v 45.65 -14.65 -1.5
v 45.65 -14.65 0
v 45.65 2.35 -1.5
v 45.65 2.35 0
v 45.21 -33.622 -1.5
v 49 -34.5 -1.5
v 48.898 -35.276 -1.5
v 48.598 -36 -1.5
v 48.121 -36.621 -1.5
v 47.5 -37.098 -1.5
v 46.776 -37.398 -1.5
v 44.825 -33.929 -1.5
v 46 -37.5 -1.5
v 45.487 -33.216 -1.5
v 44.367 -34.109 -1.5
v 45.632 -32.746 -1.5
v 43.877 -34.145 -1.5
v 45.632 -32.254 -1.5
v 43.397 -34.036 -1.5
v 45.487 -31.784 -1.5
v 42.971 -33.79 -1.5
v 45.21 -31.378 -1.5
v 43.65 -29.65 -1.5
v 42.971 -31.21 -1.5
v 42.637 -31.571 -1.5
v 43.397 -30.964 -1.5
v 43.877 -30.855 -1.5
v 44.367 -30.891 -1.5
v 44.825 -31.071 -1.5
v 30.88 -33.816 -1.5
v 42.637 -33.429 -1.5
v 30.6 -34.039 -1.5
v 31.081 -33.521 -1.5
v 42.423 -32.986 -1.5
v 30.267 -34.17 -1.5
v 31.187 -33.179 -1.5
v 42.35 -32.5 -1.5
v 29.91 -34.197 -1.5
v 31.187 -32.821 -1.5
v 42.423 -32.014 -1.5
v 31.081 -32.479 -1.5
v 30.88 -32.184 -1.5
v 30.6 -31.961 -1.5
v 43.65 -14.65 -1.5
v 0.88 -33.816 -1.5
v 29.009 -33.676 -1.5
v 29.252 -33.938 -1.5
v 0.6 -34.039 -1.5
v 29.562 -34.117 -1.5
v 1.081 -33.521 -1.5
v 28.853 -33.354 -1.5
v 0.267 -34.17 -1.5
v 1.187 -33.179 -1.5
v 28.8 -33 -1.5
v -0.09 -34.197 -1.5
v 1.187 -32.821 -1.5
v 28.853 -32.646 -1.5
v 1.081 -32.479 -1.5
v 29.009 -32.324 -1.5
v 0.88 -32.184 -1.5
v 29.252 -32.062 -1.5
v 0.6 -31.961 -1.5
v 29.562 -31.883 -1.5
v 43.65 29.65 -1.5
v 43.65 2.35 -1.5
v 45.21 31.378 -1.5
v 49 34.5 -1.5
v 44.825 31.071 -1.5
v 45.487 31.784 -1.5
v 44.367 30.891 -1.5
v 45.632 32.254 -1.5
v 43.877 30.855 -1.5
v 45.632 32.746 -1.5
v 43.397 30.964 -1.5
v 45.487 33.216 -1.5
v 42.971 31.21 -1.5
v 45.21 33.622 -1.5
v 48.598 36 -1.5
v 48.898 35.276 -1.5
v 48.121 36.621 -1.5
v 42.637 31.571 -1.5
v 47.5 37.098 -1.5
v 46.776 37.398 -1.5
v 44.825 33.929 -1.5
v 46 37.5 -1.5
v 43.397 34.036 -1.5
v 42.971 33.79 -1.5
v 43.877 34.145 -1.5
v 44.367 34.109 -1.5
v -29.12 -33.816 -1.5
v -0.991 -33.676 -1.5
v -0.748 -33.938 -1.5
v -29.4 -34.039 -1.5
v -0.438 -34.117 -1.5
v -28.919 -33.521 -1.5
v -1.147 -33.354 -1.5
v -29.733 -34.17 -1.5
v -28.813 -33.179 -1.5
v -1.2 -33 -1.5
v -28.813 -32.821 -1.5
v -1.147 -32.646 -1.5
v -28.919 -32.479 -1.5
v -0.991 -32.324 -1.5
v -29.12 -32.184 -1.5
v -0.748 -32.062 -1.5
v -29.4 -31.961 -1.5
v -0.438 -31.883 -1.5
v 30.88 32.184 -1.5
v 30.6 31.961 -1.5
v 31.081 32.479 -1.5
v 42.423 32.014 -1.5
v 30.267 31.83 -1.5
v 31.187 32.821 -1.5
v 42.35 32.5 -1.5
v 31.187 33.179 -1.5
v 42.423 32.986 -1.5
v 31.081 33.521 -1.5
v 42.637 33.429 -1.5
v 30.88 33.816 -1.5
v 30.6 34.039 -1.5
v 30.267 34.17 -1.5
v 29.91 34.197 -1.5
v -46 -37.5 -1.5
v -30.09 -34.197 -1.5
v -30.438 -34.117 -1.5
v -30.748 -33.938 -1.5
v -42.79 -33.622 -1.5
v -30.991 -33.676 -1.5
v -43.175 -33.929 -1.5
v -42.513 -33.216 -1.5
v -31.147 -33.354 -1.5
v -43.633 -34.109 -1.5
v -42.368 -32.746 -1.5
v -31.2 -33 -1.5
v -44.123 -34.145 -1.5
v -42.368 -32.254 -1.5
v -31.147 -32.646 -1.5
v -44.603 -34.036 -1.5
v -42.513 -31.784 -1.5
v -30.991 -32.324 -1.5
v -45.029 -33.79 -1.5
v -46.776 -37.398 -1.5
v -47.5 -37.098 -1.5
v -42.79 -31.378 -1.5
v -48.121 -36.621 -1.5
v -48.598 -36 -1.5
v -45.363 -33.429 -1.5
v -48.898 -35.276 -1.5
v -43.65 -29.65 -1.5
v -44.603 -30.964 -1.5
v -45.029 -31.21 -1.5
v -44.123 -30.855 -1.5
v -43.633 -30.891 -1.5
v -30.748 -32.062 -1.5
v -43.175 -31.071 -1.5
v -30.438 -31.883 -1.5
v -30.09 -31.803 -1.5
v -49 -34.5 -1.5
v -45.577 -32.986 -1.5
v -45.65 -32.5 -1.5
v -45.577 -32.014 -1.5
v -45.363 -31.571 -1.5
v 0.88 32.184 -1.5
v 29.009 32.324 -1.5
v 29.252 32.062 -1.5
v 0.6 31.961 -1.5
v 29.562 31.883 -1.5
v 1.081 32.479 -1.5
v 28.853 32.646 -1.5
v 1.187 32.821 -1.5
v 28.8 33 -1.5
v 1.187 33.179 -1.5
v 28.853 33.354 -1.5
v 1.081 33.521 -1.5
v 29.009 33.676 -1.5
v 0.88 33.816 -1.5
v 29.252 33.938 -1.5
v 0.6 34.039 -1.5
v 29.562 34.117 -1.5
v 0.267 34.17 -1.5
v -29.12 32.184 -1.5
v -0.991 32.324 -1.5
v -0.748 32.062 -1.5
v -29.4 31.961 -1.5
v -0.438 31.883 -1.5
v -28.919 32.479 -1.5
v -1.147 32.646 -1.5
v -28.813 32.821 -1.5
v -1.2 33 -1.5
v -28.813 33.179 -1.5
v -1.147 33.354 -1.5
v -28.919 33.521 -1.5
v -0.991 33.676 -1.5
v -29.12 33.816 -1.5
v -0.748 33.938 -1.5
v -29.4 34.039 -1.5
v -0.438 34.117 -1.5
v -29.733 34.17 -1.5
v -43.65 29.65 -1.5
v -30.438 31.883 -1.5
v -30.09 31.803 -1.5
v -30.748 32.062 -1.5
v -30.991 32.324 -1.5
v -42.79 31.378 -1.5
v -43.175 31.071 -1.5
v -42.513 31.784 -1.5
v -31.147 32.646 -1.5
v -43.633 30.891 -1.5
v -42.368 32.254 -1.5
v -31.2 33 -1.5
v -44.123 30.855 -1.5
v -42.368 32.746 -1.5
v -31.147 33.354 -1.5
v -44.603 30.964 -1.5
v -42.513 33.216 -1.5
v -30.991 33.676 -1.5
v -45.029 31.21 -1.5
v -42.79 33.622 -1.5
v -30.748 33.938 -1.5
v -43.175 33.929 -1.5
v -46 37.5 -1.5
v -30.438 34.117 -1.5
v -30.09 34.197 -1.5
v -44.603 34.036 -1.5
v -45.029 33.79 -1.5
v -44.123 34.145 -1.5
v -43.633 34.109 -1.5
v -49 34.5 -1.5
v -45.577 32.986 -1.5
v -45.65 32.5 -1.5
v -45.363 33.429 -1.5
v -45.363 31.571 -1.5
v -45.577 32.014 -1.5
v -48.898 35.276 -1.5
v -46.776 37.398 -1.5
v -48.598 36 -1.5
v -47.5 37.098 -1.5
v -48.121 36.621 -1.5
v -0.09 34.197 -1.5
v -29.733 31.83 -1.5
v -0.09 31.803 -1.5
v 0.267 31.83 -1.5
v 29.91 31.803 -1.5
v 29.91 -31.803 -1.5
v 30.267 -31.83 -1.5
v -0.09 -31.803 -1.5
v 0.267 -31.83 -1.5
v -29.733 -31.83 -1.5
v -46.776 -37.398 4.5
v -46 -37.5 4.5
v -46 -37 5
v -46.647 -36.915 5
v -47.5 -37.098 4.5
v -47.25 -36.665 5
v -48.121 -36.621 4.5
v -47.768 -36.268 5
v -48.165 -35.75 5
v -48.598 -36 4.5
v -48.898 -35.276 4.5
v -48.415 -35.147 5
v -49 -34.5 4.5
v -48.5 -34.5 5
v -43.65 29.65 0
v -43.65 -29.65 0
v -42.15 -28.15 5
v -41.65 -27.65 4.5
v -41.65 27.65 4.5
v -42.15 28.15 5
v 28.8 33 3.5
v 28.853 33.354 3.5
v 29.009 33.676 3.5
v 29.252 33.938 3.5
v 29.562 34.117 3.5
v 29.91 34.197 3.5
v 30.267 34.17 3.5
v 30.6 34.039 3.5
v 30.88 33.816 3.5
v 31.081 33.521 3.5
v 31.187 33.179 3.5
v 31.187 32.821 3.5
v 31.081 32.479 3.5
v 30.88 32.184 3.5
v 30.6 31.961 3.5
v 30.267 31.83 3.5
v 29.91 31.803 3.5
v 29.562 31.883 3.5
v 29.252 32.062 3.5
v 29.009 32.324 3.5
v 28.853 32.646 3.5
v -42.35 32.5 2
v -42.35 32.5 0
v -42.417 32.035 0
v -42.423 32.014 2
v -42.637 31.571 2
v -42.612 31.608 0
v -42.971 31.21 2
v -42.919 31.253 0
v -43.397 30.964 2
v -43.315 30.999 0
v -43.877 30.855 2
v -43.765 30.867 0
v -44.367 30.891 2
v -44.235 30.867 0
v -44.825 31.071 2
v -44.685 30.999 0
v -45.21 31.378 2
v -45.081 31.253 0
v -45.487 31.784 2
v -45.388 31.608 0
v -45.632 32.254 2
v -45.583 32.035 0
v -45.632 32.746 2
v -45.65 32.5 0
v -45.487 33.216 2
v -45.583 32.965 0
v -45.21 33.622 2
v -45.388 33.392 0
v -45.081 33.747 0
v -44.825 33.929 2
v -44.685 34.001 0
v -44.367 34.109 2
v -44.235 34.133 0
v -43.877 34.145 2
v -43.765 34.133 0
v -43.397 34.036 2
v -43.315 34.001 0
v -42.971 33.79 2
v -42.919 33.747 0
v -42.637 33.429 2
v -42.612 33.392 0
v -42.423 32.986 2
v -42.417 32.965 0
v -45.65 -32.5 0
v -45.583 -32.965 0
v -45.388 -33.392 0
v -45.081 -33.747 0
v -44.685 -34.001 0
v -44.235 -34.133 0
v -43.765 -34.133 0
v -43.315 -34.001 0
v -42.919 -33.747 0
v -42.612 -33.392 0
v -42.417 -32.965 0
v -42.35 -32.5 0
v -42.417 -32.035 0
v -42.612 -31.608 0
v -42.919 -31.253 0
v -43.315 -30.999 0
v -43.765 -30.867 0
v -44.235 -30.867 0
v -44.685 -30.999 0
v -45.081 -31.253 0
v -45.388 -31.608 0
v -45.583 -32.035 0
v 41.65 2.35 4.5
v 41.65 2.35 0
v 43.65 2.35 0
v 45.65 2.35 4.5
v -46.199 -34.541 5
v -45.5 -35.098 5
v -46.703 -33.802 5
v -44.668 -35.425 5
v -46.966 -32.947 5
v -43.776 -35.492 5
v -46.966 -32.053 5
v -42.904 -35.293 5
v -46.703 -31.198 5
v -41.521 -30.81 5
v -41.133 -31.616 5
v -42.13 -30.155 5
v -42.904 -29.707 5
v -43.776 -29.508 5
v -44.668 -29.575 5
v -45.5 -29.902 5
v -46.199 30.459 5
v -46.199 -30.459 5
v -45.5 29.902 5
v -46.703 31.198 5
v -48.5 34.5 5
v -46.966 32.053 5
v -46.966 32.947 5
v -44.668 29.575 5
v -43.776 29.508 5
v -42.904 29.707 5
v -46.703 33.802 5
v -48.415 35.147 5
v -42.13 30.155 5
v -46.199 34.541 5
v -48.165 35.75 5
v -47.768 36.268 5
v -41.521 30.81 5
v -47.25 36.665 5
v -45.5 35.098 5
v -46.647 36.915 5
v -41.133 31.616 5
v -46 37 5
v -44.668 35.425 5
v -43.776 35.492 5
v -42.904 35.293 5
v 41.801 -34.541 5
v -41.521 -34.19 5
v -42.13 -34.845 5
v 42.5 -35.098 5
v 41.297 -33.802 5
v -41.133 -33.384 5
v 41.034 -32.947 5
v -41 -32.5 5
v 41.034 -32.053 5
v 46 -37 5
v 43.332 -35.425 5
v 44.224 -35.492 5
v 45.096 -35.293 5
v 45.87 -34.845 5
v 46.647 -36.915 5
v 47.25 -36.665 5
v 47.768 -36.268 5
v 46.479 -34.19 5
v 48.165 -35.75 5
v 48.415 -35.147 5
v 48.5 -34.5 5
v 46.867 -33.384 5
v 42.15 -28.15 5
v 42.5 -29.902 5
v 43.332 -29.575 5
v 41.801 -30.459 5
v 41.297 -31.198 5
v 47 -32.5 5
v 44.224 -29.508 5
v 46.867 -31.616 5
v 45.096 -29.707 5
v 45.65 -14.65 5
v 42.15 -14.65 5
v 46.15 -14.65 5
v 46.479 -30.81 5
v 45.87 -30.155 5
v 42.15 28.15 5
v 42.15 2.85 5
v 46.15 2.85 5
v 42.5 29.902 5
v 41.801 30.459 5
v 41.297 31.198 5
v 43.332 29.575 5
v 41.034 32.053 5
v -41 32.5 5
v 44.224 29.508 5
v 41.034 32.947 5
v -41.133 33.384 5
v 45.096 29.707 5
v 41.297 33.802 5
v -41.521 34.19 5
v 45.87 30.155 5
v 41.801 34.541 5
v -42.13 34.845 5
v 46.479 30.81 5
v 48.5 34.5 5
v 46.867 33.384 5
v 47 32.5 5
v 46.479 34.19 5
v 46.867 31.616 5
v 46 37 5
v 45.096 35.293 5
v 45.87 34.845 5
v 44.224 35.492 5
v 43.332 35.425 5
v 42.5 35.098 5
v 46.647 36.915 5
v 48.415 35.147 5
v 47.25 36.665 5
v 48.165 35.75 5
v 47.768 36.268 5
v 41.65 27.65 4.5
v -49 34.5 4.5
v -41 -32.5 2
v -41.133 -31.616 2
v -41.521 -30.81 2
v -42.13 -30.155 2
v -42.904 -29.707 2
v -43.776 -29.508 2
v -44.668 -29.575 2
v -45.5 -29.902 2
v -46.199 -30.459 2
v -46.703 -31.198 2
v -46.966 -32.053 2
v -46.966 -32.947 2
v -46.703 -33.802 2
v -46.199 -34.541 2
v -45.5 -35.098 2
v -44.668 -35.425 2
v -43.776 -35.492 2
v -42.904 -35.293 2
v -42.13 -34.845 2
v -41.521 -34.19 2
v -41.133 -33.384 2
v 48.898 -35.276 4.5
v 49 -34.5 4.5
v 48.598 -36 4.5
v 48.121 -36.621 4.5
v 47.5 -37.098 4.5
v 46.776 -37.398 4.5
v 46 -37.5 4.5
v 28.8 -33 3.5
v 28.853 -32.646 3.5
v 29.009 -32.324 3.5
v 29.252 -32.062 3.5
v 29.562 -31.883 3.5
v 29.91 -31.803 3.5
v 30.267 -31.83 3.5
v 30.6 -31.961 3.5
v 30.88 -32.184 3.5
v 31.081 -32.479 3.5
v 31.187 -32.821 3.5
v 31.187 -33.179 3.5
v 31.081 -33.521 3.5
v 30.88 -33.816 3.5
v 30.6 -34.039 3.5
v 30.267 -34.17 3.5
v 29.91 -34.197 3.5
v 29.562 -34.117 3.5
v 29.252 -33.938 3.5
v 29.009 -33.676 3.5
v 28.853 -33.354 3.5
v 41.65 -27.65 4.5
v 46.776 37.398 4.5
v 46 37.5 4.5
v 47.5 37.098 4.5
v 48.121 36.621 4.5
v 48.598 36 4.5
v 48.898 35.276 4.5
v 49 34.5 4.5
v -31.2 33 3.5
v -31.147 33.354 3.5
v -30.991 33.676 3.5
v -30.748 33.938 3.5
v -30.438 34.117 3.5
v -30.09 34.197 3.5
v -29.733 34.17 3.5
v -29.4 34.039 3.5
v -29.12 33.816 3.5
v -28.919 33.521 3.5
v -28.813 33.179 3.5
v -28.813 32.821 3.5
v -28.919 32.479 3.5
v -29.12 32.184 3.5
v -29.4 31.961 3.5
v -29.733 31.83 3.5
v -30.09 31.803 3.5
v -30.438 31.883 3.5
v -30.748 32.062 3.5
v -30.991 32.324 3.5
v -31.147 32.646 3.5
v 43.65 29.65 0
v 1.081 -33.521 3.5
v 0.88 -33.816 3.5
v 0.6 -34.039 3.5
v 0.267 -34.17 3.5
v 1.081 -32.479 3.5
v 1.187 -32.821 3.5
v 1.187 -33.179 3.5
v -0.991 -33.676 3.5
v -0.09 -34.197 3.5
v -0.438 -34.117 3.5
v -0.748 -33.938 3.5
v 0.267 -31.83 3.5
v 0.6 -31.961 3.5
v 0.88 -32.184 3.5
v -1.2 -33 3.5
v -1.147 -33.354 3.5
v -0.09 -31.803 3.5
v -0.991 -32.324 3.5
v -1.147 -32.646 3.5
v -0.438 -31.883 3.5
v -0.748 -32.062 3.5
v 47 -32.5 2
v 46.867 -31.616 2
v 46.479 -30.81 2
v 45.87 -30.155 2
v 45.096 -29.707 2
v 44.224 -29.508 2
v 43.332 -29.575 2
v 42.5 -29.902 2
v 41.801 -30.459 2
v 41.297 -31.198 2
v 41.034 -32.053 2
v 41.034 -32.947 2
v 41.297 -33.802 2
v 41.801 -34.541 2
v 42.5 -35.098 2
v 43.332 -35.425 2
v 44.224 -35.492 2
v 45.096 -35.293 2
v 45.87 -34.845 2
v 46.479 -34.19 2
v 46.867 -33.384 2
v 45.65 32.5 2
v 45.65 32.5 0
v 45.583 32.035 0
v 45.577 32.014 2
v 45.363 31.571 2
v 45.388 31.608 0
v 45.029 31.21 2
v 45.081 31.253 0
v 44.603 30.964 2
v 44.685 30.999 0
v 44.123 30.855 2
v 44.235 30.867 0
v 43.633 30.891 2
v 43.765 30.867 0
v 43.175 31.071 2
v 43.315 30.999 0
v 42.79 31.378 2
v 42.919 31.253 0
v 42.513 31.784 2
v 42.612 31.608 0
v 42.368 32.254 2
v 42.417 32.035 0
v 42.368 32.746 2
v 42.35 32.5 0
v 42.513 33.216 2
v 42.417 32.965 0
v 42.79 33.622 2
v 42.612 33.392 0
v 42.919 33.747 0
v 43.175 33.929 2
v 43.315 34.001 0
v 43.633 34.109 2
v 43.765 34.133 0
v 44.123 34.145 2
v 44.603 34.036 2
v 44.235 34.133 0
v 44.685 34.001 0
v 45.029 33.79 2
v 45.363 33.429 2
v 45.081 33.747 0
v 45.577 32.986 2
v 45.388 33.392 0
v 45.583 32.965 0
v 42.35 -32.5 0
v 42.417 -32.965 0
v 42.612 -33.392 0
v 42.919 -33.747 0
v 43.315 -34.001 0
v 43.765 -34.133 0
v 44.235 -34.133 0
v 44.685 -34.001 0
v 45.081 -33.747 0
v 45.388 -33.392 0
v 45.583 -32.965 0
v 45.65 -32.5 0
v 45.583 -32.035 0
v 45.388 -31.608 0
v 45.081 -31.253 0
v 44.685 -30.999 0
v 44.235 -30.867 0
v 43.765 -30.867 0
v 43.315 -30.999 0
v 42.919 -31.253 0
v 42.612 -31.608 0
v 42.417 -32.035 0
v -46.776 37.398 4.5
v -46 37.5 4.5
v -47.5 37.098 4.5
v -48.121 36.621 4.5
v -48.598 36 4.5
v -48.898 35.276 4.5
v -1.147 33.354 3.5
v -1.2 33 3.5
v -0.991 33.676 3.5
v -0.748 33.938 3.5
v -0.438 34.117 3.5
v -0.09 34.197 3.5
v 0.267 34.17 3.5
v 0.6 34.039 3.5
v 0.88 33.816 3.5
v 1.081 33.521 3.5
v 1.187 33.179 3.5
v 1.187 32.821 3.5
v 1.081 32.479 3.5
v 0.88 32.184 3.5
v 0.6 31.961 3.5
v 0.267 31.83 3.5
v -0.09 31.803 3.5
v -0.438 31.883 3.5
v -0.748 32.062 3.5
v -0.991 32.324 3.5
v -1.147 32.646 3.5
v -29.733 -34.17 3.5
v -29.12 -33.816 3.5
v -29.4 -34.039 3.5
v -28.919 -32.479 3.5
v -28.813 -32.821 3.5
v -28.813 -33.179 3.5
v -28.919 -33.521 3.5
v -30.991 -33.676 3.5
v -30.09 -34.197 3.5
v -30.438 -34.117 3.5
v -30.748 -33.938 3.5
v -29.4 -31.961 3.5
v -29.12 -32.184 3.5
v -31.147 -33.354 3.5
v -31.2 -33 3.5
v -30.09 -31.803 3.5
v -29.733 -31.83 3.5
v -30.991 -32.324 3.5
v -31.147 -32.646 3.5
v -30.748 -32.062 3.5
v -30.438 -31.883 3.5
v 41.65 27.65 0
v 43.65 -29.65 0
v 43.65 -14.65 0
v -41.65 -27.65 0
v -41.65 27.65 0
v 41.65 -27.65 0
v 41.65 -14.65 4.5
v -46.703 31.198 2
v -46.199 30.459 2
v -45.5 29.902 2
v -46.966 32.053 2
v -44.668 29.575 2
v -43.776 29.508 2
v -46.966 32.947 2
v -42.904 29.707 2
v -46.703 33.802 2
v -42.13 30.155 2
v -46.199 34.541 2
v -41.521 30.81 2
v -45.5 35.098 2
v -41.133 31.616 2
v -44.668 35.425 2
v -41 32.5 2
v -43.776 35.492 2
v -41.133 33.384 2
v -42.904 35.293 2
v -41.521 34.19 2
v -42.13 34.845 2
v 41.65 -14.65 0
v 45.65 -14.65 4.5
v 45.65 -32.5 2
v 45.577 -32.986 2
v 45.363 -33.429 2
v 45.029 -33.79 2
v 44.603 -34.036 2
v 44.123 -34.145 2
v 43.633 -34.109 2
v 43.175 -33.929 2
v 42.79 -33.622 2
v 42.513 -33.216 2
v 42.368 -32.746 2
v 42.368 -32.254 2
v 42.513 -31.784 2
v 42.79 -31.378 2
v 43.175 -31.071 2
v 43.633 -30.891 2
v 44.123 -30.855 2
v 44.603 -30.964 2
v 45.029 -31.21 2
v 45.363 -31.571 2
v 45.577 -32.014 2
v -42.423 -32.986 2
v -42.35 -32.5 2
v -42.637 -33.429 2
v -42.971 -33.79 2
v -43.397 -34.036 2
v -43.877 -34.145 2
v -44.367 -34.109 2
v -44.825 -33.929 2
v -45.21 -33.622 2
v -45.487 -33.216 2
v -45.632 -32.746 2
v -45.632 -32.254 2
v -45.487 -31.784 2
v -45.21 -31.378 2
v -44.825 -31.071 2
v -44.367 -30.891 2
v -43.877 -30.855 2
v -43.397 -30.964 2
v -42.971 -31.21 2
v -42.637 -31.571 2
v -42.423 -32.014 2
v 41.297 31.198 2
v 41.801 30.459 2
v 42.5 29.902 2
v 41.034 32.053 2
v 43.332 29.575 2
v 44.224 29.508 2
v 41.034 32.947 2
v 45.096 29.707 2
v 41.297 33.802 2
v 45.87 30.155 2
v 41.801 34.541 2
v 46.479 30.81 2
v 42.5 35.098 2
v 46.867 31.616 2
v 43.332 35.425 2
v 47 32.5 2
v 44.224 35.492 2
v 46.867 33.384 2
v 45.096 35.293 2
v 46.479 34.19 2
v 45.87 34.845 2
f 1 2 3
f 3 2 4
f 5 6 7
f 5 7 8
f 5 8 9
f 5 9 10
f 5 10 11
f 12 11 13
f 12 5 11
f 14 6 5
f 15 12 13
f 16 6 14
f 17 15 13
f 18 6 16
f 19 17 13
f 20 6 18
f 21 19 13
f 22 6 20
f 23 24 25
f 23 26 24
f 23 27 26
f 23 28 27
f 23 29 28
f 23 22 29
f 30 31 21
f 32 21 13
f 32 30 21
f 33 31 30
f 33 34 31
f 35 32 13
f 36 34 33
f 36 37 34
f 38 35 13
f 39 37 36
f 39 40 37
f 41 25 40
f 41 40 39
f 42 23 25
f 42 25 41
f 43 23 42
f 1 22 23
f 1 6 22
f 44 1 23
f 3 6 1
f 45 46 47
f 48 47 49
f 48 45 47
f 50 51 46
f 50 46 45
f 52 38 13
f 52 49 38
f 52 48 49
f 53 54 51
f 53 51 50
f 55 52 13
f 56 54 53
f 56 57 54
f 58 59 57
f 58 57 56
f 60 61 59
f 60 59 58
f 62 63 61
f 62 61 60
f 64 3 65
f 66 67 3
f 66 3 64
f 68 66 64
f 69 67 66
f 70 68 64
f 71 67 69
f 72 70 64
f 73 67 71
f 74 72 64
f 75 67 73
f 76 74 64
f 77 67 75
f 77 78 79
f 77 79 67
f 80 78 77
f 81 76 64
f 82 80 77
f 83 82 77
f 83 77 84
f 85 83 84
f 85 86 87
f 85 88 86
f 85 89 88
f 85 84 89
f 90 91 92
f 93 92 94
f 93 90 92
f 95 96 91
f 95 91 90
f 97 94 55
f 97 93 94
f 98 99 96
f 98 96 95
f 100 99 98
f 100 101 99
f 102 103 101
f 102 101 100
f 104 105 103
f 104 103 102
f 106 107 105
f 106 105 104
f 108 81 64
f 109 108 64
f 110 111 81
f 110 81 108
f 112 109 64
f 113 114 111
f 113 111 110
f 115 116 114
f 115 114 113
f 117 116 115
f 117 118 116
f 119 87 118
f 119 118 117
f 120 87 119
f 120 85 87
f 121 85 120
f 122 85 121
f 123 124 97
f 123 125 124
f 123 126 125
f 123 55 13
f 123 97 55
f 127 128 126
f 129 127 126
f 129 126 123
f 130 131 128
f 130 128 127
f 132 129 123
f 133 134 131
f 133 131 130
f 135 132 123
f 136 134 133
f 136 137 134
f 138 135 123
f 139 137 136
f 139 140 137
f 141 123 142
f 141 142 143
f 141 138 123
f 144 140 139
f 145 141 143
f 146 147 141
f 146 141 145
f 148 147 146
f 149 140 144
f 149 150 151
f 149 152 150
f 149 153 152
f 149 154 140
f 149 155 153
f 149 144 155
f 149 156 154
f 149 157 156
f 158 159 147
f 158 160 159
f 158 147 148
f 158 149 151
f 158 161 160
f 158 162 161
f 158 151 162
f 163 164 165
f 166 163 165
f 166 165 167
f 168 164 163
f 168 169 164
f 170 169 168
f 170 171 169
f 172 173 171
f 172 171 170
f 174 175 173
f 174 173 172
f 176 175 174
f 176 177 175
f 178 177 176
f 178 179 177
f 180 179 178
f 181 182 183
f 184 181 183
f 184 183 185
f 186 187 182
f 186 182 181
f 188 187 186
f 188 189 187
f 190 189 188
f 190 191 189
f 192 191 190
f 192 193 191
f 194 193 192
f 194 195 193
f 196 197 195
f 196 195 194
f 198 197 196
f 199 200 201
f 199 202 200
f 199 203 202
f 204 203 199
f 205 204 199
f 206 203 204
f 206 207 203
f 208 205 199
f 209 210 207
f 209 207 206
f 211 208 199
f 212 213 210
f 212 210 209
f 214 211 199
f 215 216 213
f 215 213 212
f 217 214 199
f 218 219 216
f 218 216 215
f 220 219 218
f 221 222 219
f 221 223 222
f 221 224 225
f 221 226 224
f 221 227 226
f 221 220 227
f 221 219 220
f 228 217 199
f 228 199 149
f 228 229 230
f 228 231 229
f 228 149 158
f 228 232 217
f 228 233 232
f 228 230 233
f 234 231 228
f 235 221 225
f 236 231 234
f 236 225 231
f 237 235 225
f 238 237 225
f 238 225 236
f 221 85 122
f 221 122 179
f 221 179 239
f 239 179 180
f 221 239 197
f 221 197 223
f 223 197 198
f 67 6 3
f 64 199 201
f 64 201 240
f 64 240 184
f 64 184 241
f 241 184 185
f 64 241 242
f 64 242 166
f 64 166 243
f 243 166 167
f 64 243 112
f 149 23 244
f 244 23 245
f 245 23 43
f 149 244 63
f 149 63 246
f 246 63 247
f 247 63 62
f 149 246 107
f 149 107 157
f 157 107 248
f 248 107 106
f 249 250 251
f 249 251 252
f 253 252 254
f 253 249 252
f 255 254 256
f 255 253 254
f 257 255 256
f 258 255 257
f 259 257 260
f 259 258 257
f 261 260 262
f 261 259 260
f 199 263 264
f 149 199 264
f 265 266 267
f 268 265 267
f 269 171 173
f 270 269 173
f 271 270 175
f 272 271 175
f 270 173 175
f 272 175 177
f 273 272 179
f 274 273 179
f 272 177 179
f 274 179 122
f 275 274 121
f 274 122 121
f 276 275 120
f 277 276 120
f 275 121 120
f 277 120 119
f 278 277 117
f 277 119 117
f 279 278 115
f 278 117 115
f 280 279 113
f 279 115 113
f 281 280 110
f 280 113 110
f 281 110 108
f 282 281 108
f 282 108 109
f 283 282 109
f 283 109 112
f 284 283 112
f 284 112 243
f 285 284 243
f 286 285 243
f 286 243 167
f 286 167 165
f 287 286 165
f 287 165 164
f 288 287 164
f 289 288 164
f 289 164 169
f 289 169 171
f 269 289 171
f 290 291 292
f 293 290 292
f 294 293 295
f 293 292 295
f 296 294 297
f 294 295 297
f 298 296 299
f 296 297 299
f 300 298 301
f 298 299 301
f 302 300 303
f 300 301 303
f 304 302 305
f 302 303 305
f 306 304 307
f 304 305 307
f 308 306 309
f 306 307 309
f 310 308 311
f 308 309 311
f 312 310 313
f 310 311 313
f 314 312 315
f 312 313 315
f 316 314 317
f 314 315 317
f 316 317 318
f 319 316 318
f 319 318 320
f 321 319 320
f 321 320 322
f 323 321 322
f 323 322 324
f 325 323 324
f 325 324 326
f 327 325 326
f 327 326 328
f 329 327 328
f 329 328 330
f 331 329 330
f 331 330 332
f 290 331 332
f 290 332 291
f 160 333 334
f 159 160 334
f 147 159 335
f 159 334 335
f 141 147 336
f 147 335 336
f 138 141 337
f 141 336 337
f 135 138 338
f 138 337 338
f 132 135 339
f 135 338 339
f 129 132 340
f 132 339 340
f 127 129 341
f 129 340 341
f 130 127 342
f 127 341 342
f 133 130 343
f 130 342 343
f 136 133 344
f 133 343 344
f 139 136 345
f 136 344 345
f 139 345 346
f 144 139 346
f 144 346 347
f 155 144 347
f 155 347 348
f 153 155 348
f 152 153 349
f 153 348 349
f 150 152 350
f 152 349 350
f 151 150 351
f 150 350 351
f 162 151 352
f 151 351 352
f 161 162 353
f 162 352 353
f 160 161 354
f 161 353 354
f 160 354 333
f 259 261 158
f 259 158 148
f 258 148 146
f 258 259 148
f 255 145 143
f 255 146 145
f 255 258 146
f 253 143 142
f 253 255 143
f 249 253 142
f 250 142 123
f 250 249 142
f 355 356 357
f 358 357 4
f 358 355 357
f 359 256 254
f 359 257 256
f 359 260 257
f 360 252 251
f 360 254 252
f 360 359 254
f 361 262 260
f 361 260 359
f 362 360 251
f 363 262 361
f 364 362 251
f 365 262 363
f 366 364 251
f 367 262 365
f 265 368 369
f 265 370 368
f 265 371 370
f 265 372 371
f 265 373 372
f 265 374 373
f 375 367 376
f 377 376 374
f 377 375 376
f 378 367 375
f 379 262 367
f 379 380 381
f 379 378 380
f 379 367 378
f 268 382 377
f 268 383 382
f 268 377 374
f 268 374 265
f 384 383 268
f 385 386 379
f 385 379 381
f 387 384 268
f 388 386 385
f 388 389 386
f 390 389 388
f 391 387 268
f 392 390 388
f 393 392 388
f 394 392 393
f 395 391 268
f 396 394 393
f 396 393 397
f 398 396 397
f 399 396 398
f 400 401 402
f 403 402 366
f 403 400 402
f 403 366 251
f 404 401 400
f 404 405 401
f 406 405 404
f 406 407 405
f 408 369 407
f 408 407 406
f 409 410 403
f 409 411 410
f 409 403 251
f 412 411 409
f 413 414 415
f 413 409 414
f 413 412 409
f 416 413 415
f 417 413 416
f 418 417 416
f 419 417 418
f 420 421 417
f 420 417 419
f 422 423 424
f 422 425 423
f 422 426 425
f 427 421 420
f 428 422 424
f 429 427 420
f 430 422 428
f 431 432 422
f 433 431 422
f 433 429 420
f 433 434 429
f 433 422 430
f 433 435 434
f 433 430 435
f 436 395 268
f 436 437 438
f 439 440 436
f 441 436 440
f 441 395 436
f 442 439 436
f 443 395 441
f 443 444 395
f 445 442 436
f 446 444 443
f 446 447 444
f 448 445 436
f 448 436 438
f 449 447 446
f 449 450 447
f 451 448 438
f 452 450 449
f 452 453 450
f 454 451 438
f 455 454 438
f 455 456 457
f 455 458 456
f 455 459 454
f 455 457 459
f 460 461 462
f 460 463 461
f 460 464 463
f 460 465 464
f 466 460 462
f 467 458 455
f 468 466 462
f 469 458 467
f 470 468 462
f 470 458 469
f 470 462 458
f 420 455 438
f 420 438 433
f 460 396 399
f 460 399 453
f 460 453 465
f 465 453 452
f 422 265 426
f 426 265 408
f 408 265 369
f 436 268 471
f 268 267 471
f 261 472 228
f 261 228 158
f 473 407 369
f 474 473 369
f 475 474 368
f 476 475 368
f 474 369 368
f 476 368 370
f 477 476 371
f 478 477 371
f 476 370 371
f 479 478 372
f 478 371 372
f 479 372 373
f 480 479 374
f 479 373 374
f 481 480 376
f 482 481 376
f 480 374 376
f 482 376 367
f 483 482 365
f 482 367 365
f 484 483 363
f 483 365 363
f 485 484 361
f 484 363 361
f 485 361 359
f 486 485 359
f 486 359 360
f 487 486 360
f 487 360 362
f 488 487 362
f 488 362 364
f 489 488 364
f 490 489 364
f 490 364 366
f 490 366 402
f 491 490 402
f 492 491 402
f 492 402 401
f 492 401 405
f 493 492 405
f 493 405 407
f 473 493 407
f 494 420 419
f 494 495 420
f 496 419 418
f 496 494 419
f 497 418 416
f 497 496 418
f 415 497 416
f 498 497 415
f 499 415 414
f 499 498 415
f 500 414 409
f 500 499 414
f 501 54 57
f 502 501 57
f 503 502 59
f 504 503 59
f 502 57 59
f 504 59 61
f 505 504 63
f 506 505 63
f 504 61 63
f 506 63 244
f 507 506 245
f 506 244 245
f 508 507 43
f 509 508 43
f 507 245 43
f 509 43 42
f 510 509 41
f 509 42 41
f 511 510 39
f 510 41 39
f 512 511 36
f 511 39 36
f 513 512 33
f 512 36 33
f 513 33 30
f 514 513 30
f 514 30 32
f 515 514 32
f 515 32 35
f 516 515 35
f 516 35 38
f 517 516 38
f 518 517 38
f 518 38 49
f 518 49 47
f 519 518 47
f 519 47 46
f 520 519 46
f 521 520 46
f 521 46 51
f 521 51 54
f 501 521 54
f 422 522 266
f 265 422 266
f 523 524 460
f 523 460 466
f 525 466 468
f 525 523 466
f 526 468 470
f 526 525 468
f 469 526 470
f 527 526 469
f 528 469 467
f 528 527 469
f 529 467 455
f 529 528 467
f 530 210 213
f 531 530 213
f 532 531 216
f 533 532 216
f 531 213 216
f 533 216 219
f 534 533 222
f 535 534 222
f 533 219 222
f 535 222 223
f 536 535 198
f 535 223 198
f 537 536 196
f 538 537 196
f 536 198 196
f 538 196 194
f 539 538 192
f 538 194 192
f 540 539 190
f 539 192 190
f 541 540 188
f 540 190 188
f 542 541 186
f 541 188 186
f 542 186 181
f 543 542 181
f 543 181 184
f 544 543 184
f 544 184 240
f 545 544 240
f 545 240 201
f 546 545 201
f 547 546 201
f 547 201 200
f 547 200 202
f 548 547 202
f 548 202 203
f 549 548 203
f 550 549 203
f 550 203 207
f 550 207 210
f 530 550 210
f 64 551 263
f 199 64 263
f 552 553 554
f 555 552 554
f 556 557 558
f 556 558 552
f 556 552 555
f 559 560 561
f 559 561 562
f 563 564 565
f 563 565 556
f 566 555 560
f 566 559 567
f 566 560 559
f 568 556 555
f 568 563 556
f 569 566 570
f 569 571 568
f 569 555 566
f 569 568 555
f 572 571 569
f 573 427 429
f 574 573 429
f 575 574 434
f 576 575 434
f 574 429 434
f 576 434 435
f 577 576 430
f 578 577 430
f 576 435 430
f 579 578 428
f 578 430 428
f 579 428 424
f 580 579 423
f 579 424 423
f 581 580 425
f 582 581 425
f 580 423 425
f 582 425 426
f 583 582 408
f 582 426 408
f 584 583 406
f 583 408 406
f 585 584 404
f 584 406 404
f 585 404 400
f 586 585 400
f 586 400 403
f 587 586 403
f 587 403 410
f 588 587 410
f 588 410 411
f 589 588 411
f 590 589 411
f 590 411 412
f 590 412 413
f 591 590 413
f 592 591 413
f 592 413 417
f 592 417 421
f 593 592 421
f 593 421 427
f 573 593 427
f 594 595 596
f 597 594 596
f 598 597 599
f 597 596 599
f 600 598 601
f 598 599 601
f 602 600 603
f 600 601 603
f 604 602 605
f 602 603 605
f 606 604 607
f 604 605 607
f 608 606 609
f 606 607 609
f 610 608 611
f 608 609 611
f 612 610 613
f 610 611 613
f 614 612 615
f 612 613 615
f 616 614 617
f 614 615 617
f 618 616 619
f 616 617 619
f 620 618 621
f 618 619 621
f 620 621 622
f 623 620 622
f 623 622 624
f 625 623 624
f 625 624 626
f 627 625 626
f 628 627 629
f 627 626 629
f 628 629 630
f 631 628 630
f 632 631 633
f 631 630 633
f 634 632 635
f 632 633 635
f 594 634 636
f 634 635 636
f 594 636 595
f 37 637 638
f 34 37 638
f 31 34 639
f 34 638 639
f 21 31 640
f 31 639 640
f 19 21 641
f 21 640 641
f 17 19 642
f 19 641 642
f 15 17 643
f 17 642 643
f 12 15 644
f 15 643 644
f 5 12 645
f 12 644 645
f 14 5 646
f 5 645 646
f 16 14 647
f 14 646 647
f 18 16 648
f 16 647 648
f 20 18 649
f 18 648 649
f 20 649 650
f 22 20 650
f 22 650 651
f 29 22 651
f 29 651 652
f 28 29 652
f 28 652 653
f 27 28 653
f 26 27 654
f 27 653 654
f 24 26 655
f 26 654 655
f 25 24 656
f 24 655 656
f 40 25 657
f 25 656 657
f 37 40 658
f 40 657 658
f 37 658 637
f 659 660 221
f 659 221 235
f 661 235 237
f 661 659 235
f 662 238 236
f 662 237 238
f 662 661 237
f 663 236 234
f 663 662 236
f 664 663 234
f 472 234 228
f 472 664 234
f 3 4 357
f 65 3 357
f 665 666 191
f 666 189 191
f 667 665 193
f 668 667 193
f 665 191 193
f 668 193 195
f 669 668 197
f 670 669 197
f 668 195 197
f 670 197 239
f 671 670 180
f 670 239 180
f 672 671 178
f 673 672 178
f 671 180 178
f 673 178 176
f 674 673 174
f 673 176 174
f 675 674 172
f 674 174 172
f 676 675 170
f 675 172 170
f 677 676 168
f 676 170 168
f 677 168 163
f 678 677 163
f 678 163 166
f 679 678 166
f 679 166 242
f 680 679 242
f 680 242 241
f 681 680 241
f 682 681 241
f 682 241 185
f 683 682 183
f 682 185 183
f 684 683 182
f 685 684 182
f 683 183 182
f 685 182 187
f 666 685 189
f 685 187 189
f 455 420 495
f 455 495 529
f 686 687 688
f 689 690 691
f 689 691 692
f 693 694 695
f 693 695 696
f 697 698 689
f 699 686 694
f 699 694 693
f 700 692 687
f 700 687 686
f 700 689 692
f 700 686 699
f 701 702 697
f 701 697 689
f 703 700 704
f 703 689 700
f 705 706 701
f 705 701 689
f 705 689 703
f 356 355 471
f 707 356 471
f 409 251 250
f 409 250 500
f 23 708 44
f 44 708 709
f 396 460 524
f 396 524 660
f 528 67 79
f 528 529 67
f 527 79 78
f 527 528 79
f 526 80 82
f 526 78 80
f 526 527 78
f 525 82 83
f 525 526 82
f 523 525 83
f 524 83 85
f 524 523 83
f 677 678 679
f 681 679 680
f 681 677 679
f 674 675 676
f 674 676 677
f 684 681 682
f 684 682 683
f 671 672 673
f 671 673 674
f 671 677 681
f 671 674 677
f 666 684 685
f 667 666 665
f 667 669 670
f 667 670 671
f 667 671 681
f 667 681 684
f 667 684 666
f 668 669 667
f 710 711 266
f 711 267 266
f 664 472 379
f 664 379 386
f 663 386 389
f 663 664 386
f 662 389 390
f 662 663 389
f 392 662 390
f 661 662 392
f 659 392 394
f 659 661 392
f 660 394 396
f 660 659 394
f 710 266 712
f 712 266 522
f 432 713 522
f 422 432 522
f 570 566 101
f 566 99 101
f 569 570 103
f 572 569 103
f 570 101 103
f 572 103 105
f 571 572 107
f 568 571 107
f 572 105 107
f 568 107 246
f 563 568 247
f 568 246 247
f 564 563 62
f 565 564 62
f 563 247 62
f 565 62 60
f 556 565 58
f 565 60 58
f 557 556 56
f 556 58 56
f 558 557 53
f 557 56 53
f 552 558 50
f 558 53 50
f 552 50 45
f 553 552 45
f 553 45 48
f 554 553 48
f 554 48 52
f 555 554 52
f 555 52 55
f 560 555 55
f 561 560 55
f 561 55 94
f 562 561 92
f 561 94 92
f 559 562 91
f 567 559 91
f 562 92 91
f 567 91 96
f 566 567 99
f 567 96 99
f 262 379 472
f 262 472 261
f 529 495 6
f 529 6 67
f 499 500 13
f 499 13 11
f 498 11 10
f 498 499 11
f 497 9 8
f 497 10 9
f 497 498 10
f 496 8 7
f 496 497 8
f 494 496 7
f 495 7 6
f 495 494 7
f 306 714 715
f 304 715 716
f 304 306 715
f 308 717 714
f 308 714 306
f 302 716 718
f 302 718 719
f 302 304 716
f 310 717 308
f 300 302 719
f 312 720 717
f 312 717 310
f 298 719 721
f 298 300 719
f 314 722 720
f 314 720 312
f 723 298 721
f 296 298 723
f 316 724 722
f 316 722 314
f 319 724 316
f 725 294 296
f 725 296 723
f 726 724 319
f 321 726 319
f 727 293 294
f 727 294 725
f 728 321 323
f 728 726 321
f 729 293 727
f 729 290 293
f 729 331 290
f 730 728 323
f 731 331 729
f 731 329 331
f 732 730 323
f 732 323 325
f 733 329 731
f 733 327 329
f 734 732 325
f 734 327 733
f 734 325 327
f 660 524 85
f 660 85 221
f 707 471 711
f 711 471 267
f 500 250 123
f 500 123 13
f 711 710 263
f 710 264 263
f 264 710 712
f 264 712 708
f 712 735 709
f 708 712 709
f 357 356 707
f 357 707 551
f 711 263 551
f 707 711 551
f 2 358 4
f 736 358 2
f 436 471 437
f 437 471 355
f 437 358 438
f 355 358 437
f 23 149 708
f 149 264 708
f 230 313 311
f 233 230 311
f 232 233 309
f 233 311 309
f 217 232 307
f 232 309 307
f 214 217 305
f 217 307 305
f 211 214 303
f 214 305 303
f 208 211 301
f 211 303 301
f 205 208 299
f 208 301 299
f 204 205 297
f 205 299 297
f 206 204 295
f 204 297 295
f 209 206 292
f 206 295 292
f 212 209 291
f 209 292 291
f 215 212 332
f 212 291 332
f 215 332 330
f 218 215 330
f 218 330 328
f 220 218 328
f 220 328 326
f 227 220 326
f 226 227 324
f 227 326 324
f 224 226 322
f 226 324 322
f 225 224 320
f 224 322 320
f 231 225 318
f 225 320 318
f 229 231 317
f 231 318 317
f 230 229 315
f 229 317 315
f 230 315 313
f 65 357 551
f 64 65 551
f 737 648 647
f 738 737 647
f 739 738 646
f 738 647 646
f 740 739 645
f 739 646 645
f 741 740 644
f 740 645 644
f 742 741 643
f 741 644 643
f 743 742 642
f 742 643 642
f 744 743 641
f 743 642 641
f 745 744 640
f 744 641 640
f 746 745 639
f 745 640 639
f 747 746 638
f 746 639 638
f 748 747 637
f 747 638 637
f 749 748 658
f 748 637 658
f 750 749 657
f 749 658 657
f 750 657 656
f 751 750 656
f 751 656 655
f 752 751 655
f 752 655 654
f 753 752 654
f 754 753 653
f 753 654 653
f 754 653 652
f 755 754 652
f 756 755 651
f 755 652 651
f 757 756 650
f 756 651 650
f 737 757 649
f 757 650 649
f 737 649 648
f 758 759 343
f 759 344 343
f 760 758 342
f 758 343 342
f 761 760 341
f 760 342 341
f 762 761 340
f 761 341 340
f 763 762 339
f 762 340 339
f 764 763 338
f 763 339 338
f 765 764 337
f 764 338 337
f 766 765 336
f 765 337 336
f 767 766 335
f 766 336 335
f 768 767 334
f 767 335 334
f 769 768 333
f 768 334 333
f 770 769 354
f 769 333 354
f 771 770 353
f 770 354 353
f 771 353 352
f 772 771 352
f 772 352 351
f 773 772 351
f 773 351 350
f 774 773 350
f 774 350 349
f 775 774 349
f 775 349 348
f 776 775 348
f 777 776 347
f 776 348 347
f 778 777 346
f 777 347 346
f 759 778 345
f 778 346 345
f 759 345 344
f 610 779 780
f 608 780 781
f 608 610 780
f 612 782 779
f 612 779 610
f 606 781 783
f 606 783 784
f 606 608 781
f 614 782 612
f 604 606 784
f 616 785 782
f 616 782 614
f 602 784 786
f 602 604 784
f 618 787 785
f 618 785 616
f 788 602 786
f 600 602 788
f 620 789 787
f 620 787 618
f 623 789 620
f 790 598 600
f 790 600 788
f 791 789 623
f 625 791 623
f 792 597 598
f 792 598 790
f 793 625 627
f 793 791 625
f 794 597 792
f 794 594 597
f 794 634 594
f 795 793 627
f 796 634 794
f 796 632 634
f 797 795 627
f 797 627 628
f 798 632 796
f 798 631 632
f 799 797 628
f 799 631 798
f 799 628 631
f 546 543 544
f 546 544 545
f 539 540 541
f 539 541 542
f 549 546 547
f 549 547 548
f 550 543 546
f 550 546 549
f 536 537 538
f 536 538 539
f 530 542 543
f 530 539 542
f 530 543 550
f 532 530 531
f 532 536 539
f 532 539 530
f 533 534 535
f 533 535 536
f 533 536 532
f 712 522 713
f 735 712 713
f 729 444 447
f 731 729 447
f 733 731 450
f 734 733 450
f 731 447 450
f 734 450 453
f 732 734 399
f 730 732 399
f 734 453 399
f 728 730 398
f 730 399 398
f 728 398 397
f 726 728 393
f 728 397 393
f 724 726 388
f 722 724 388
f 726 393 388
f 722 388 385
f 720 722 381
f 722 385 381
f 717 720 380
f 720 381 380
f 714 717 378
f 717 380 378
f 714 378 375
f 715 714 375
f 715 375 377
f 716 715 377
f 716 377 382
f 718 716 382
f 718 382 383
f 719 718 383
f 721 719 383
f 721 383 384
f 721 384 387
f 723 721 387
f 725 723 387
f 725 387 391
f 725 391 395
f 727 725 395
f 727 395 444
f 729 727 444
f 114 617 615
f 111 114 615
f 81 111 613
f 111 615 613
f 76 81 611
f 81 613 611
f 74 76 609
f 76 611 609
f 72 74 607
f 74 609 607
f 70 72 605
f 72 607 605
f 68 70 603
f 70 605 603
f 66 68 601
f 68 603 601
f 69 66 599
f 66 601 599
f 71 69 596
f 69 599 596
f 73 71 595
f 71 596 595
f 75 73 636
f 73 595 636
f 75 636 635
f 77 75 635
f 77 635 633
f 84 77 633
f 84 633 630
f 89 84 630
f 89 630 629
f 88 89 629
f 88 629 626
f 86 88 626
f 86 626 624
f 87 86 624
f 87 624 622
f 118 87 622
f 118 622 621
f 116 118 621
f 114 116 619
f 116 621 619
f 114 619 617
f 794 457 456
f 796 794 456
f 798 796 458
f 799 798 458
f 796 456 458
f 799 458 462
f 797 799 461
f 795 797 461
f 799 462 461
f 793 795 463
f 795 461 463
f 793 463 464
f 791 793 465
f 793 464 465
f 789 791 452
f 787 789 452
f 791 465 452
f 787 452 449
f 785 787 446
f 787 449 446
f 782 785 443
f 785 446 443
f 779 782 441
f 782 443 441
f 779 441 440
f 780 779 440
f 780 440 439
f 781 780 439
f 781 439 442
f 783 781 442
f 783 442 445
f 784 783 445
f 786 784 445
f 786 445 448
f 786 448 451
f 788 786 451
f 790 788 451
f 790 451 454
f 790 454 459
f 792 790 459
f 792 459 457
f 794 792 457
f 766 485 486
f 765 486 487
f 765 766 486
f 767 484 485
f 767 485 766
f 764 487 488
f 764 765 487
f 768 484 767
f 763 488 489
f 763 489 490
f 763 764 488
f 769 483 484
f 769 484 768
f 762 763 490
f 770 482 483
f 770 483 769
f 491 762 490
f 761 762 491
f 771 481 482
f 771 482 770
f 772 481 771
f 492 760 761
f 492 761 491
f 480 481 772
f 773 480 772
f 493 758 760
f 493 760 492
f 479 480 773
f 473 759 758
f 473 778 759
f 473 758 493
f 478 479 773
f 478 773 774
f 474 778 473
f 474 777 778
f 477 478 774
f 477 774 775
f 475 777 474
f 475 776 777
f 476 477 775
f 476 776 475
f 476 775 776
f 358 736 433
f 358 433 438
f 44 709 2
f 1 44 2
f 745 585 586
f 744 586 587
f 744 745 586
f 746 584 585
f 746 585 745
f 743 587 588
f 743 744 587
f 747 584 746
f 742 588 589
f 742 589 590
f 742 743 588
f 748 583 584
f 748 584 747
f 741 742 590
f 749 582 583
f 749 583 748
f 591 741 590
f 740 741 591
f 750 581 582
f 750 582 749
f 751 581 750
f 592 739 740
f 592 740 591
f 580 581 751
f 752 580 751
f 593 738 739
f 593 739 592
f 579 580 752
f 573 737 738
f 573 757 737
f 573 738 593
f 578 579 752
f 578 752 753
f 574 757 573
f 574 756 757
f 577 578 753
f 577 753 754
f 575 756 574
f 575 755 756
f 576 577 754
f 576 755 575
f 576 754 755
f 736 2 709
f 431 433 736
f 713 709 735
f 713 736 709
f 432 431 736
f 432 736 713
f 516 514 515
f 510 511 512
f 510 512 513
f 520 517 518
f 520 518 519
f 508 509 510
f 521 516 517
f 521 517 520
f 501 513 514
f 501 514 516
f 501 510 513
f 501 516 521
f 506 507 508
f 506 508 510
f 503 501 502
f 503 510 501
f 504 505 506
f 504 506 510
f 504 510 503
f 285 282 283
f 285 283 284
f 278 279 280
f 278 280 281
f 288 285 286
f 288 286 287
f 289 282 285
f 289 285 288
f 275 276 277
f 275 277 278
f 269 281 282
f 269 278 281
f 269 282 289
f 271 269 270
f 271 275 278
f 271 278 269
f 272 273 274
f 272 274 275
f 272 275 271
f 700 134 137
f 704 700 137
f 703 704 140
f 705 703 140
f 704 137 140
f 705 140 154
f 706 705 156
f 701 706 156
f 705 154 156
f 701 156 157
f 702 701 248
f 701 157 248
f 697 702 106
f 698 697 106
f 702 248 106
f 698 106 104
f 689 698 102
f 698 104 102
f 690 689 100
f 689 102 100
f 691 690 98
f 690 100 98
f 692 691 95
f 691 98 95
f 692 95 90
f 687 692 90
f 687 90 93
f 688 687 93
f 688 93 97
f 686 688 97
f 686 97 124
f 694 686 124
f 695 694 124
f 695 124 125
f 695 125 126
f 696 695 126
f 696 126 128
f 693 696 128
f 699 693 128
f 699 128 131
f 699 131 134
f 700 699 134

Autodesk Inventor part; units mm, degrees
ref_plane "YZ Plane" through (0, 0, 0) normal (1, 0, 0) x (0, 1, 0)
ref_plane "XZ Plane" through (0, 0, 0) normal (0, 1, 0) x (-1, 0, 0)
ref_plane "XY Plane" through (0, 0, 0) normal (0, 0, 1) x (1, 0, 0)
sketch "Sketch1" plane through (0, 0, 0) normal (0, 0, 1) x (1, 0, 0)
  line L0 (46, -37.5) -> (-46, -37.5)
  line L1 (-49, -34.5) -> (-49, 34.5)
  line L2 (-46, 37.5) -> (46, 37.5)
  line L3 (49, 34.5) -> (49, -34.5)
  line L4 (49, -37.5) -> (-49, 37.5) construction
  line L5 (-49, -37.5) -> (49, 37.5) construction
  line L6 (44, -32.5) -> (-44, -32.5) construction
  line L7 (-44, -32.5) -> (-44, 32.5) construction
  line L8 (-44, 32.5) -> (44, 32.5) construction
  line L9 (44, 32.5) -> (44, -32.5) construction
  line L10 (44, -32.5) -> (-44, 32.5) construction
  line L11 (-44, -32.5) -> (44, 32.5) construction
  arc A0 (-46, 37.5) -> (-49, 34.5) centre (-46, 34.5) ccw
  arc A1 (49, 34.5) -> (46, 37.5) centre (46, 34.5) ccw
  arc A2 (46, -37.5) -> (49, -34.5) centre (46, -34.5) ccw
  circle A3 centre (-44, 32.5) radius 1.65
  circle A4 centre (-44, -32.5) radius 1.65
  circle A5 centre (44, -32.5) radius 1.65
  circle A6 centre (44, 32.5) radius 1.65
  arc A7 (-49, -34.5) -> (-46, -37.5) centre (-46, -34.5) ccw
  point P0 (0, 0)
  dimension "d0" = 75
  dimension "d1" = 98
  dimension "d2" = 3
  dimension "d3" = 88
  dimension "d4" = 65
  dimension "d5" = 3.3
  dimension "d6" = 3
extrude "Extrusion1" add sketch "Sketch1" along normal blind 5
sketch "Sketch2" plane through (0, 0, 5) normal (0, 0, 1) x (1, 0, 0)
  line L0 (-41.65, -27.65) -> (41.65, -27.65)
  line L1 (41.65, 27.65) -> (-41.65, 27.65)
  line L2 (-41.65, 27.65) -> (-41.65, -27.65)
  line L3 (-41.65, -27.65) -> (41.65, 27.65) construction
  line L4 (41.65, -27.65) -> (-41.65, 27.65) construction
  line L5 (41.65, 2.35) -> (45.65, 2.35)
  line L6 (45.65, 2.35) -> (45.65, -14.65)
  line L7 (45.65, -14.65) -> (41.65, -14.65)
  line L8 (41.65, -27.65) -> (41.65, -14.65)
  line L9 (41.65, 2.35) -> (41.65, 27.65)
  point P0 (0, 0)
  dimension "d9" = 55.3
  dimension "d10" = 83.3
  dimension "d11" = 13
  dimension "d12" = 4
  dimension "d13" = 30
extrude "Extrusion2" cut sketch "Sketch2" against normal through all
sketch "Sketch3" plane through (0, 0, 0) normal (0, 0, -1) x (-1, 0, 0)
  line L0 (41.65, -27.65) -> (-41.65, -27.65) projected
  line L1 (-41.65, -27.65) -> (-41.65, -14.65) projected
  line L2 (-41.65, -14.65) -> (-45.65, -14.65) construction
  line L3 (-45.65, -14.65) -> (-45.65, 2.35) construction
  line L4 (-45.65, 2.35) -> (-41.65, 2.35) construction
  line L5 (-41.65, 2.35) -> (-41.65, 27.65) projected
  line L6 (-41.65, 27.65) -> (41.65, 27.65) projected
  line L7 (41.65, 27.65) -> (41.65, -27.65) projected
  arc A0 (-49, -34.5) -> (-46, -37.5) centre (-46, -34.5) ccw projected
  line L8 (46, -37.5) -> (-46, -37.5) projected
  arc A1 (46, -37.5) -> (49, -34.5) centre (46, -34.5) ccw projected
  line L9 (49, 34.5) -> (49, -34.5) projected
  arc A2 (49, 34.5) -> (46, 37.5) centre (46, 34.5) ccw projected
  line L10 (-46, 37.5) -> (46, 37.5) projected
  arc A3 (-46, 37.5) -> (-49, 34.5) centre (-46, 34.5) ccw projected
  line L11 (-49, -34.5) -> (-49, 34.5) projected
  circle A4 centre (-44, 32.5) radius 1.65 projected
  circle A5 centre (-44, -32.5) radius 1.65 projected
  circle A6 centre (44, -32.5) radius 1.65 projected
  circle A7 centre (44, 32.5) radius 1.65 projected
  line L12 (43.65, -29.65) -> (-43.65, -29.65)
  line L13 (-43.65, -29.65) -> (-43.65, 29.65)
  line L14 (-43.65, 29.65) -> (43.65, 29.65)
  line L15 (43.65, 29.65) -> (43.65, -29.65)
  line L16 (43.65, -29.65) -> (-43.65, 29.65) construction
  line L17 (-43.65, -29.65) -> (43.65, 29.65) construction
  point P0 (0, 0)
  dimension "d16" = 2
  dimension "d17" = 2
extrude "Extrusion3" add sketch "Sketch3" along normal blind 1.5
sketch "Sketch4" plane through (0, 0, -1.5) normal (0, 0, -1) x (-1, 0, 0)
  line L0 (30, -33) -> (-30, -33) construction
  line L1 (-30, -33) -> (-30, 33) construction
  line L2 (-30, 33) -> (30, 33) construction
  line L3 (30, 33) -> (30, -33) construction
  line L4 (30, -33) -> (-30, 33) construction
  line L5 (-30, -33) -> (30, 33) construction
  circle A0 centre (-30, 33) radius 1.2
  circle A1 centre (30, 33) radius 1.2
  circle A2 centre (-30, -33) radius 1.2
  circle A3 centre (30, -33) radius 1.2
  line L6 (46, 37.5) -> (-46, 37.5) projected
  circle A4 centre (0, 33) radius 1.2
  circle A5 centre (0, -33) radius 1.2
  point P0 (0, 0)
  dimension "d20" = 2.4
  dimension "d21" = 4.5
  dimension "d22" = 60
extrude "Extrusion4" cut sketch "Sketch4" against normal blind 5
sketch "Sketch5" plane through (0, 0, 0) normal (0, 0, 1) x (1, 0, 0)
  line L0 (45.65, 2.35) -> (43.65, 2.35) projected
  line L1 (43.65, -14.65) -> (43.65, 2.35) projected
  line L2 (43.65, -14.65) -> (45.65, -14.65) projected
  line L3 (45.65, -14.65) -> (45.65, 2.35) projected
  point P0 (0, 0)
extrude "Extrusion5" cut sketch "Sketch5" against normal blind 5
sketch "Sketch6" plane through (0, 0, 5) normal (0, 0, 1) x (1, 0, 0)
  circle A0 centre (-44, 32.5) radius 1.65 projected
  circle A1 centre (-44, 32.5) radius 3
  circle A2 centre (44, 32.5) radius 1.65 projected
  circle A3 centre (44, 32.5) radius 3
  circle A4 centre (44, -32.5) radius 1.65 projected
  circle A5 centre (44, -32.5) radius 3
  circle A6 centre (-44, -32.5) radius 1.65 projected
  circle A7 centre (-44, -32.5) radius 3
  point P0 (0, 0)
  dimension "d27" = 6
extrude "Extrusion6" cut sketch "Sketch6" against normal blind 3 contours A0 | A1 | A2 | A3 | A4 | A5 | A6 | A7
chamfer "Chamfer1" distance 0.5 angle 45 15 edges at (49, 0, 5) (48.1213, 36.6213, 5) (0, 37.5, 5) (-48.1213, 36.6213, 5) (-49, 0, 5) (-48.1213, -36.6213, 5) (0, -37.5, 5) (48.1213, -36.6213, 5) (45.65, -6.15, 5) (43.65, 2.35, 5) (41.65, 15, 5) (0, 27.65, 5) (0, -27.65, 5) (41.65, -21.15, 5) (-41.65, 0, 5)
properties part number "MainLid"
